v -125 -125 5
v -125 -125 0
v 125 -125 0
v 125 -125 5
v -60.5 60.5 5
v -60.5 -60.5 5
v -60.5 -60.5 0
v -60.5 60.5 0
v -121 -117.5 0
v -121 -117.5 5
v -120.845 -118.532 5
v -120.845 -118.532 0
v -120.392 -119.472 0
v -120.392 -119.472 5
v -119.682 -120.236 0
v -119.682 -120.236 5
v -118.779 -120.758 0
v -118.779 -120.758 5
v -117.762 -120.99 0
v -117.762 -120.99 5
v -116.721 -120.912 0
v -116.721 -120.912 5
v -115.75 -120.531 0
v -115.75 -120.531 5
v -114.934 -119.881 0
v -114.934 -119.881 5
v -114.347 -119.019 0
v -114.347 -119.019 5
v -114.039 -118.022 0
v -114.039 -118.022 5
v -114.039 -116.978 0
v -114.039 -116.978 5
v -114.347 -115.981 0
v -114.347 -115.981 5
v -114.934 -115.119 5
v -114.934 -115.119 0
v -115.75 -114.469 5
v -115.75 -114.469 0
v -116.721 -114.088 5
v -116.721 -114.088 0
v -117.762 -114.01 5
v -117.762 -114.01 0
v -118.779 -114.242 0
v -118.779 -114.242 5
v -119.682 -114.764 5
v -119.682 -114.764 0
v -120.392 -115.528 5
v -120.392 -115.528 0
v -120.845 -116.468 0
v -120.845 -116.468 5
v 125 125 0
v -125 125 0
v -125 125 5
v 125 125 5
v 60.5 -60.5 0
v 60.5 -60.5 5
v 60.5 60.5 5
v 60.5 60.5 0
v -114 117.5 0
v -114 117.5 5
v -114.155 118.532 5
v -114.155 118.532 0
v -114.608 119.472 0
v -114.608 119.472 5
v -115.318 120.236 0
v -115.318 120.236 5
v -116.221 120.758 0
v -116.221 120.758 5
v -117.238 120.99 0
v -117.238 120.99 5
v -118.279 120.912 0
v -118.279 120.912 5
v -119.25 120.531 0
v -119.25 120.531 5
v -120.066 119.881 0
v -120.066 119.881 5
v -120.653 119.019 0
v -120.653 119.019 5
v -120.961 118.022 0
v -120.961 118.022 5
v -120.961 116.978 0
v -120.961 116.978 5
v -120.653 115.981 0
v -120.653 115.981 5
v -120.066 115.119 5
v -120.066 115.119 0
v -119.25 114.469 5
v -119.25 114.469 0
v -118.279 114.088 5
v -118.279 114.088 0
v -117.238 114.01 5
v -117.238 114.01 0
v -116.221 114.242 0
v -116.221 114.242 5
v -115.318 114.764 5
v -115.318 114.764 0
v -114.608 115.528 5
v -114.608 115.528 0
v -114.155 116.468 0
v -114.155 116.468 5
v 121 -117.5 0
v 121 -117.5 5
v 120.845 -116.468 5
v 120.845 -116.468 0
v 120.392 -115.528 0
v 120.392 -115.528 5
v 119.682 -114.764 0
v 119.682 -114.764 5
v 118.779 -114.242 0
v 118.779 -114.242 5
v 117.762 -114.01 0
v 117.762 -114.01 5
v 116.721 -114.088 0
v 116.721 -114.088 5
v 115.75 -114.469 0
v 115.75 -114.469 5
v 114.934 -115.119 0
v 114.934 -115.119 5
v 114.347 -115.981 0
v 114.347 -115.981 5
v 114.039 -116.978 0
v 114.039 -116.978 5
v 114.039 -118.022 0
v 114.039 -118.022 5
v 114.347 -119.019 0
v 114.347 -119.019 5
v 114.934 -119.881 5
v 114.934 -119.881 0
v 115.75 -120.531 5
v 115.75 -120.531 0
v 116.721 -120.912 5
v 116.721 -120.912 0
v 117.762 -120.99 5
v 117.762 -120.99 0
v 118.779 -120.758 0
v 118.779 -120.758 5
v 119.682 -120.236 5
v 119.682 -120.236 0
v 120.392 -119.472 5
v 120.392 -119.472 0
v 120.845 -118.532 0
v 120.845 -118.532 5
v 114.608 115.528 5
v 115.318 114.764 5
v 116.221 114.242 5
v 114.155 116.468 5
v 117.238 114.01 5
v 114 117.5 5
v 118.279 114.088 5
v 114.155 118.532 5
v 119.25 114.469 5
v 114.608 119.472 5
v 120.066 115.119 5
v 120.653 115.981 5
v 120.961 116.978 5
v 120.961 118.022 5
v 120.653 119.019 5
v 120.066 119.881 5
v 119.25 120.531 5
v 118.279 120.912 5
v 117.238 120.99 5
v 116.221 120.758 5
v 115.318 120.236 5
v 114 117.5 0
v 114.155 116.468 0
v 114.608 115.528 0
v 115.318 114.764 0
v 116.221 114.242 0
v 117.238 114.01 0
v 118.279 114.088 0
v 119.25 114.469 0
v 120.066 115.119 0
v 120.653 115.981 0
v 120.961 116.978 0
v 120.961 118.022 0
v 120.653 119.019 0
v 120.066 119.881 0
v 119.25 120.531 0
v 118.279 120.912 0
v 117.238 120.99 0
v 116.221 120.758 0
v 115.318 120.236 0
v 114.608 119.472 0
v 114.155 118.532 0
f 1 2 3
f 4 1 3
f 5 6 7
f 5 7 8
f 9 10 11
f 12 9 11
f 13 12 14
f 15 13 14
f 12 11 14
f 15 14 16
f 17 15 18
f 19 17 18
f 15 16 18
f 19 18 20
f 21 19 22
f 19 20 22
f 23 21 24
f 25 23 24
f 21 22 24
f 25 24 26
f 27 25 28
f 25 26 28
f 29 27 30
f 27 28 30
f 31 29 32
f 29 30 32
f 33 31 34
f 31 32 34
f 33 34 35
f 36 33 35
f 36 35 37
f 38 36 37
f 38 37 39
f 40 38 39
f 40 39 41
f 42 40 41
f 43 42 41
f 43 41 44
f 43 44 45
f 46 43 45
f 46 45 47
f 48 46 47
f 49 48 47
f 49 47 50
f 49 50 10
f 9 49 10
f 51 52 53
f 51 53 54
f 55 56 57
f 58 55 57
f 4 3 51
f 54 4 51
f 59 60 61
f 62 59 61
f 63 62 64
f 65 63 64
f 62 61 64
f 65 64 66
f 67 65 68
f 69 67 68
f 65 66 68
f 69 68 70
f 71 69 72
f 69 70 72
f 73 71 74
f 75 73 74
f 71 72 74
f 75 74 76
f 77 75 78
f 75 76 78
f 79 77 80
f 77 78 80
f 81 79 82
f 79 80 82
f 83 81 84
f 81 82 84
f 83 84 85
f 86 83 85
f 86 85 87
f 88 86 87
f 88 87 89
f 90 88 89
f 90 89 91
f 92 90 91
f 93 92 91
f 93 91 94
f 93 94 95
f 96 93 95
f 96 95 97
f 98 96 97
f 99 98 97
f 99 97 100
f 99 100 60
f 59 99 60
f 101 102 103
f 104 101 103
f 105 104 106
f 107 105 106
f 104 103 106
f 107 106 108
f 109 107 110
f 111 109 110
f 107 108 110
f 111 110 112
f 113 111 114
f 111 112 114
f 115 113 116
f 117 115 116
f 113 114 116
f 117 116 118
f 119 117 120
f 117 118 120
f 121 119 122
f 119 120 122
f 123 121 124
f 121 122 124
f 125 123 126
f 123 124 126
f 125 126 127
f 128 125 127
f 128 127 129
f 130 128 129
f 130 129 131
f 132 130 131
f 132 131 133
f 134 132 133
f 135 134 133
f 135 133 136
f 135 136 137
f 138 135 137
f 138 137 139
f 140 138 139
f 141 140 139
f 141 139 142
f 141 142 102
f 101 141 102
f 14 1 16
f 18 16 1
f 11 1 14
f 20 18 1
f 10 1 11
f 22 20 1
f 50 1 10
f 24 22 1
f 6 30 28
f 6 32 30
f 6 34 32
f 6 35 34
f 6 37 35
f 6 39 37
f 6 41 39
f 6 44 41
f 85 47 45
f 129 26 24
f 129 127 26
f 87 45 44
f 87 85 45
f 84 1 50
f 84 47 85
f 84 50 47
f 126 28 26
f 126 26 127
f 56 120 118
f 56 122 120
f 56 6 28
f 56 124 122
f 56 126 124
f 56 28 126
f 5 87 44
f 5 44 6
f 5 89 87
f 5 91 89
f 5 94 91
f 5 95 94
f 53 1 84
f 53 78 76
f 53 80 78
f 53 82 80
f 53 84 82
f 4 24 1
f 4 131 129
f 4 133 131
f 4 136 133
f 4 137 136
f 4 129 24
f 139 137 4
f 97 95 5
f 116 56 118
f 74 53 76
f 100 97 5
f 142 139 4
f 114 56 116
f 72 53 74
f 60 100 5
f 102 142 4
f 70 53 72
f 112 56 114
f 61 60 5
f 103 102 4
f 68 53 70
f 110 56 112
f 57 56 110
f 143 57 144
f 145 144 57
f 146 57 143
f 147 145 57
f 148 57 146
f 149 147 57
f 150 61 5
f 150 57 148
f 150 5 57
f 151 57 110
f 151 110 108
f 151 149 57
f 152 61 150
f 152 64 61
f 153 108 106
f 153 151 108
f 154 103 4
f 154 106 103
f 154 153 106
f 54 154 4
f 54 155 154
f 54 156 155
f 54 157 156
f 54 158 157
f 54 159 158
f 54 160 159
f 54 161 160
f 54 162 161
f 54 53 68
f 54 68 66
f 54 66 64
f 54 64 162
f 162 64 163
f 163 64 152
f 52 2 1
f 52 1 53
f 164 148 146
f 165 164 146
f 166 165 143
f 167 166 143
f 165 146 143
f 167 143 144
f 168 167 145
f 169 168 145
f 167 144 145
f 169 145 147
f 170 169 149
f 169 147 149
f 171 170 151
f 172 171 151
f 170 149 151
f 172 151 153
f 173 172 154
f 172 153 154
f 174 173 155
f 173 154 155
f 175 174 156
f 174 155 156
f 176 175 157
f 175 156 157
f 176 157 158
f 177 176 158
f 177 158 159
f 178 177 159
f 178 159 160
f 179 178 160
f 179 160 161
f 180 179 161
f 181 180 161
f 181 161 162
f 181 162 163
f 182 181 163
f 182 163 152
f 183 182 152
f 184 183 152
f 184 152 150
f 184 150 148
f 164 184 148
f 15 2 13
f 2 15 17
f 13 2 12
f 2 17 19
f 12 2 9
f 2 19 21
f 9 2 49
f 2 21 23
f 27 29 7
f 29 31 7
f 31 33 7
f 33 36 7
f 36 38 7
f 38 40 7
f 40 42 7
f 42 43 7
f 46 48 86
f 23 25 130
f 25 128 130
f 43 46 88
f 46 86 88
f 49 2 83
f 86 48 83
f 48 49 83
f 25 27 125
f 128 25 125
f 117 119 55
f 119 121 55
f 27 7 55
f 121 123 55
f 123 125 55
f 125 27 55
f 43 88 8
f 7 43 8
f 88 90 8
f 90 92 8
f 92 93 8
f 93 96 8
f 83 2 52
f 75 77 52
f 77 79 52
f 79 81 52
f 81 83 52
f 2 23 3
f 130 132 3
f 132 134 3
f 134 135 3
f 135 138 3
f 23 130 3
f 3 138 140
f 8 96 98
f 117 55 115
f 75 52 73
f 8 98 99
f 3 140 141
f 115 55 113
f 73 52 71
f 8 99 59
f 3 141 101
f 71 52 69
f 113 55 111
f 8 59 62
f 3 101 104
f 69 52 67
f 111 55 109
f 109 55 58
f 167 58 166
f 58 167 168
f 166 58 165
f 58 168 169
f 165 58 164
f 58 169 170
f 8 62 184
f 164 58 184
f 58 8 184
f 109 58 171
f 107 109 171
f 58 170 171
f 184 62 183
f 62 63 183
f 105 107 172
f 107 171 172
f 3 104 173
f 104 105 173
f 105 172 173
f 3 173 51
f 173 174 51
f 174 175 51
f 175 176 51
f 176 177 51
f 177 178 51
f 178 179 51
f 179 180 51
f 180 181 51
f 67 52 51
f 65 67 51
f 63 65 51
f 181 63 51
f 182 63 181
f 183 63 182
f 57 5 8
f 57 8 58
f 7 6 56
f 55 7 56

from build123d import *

# Parameters (mm, degrees)
ESBO_O1_W                = 250
ESBO_O1_H                = 250
RESSALTO_EXTRUS_O1_DEPTH = 5
ESBO_O2_R                = 3.5
CORTE_EXTRUS_O1_DEPTH    = 177.847391838
ESBO_O3_W                = 121
ESBO_O3_H                = 121
CORTE_EXTRUS_O2_DEPTH    = 177.847391838


with BuildPart() as part:
    # Esboço1 → Ressalto-extrusão1 (new body)
    with BuildSketch(Plane.XY):
        Rectangle(ESBO_O1_W, ESBO_O1_H)
    extrude(amount=RESSALTO_EXTRUS_O1_DEPTH)

    # Esboço2 → Corte-extrusão1 (cut, through all)
    with BuildSketch(Plane.XY.offset(5)):
        with Locations((-117.5, 117.5)):
            Circle(ESBO_O2_R)
        with Locations(Location((117.5, 117.5, 0), (0, 0, 180))):
            Circle(ESBO_O2_R)
        with Locations(Location((-117.5, -117.5, 0), (0, 0, 180))):
            Circle(ESBO_O2_R)
        with Locations((117.5, -117.5)):
            Circle(ESBO_O2_R)
    extrude(amount=-CORTE_EXTRUS_O1_DEPTH, mode=Mode.SUBTRACT)

    # Esboço3 → Corte-extrusão2 (cut, through all)
    with BuildSketch(Plane.XY.offset(5)):
        Rectangle(ESBO_O3_W, ESBO_O3_H)
    extrude(amount=-CORTE_EXTRUS_O2_DEPTH, mode=Mode.SUBTRACT)


solid = part.part
